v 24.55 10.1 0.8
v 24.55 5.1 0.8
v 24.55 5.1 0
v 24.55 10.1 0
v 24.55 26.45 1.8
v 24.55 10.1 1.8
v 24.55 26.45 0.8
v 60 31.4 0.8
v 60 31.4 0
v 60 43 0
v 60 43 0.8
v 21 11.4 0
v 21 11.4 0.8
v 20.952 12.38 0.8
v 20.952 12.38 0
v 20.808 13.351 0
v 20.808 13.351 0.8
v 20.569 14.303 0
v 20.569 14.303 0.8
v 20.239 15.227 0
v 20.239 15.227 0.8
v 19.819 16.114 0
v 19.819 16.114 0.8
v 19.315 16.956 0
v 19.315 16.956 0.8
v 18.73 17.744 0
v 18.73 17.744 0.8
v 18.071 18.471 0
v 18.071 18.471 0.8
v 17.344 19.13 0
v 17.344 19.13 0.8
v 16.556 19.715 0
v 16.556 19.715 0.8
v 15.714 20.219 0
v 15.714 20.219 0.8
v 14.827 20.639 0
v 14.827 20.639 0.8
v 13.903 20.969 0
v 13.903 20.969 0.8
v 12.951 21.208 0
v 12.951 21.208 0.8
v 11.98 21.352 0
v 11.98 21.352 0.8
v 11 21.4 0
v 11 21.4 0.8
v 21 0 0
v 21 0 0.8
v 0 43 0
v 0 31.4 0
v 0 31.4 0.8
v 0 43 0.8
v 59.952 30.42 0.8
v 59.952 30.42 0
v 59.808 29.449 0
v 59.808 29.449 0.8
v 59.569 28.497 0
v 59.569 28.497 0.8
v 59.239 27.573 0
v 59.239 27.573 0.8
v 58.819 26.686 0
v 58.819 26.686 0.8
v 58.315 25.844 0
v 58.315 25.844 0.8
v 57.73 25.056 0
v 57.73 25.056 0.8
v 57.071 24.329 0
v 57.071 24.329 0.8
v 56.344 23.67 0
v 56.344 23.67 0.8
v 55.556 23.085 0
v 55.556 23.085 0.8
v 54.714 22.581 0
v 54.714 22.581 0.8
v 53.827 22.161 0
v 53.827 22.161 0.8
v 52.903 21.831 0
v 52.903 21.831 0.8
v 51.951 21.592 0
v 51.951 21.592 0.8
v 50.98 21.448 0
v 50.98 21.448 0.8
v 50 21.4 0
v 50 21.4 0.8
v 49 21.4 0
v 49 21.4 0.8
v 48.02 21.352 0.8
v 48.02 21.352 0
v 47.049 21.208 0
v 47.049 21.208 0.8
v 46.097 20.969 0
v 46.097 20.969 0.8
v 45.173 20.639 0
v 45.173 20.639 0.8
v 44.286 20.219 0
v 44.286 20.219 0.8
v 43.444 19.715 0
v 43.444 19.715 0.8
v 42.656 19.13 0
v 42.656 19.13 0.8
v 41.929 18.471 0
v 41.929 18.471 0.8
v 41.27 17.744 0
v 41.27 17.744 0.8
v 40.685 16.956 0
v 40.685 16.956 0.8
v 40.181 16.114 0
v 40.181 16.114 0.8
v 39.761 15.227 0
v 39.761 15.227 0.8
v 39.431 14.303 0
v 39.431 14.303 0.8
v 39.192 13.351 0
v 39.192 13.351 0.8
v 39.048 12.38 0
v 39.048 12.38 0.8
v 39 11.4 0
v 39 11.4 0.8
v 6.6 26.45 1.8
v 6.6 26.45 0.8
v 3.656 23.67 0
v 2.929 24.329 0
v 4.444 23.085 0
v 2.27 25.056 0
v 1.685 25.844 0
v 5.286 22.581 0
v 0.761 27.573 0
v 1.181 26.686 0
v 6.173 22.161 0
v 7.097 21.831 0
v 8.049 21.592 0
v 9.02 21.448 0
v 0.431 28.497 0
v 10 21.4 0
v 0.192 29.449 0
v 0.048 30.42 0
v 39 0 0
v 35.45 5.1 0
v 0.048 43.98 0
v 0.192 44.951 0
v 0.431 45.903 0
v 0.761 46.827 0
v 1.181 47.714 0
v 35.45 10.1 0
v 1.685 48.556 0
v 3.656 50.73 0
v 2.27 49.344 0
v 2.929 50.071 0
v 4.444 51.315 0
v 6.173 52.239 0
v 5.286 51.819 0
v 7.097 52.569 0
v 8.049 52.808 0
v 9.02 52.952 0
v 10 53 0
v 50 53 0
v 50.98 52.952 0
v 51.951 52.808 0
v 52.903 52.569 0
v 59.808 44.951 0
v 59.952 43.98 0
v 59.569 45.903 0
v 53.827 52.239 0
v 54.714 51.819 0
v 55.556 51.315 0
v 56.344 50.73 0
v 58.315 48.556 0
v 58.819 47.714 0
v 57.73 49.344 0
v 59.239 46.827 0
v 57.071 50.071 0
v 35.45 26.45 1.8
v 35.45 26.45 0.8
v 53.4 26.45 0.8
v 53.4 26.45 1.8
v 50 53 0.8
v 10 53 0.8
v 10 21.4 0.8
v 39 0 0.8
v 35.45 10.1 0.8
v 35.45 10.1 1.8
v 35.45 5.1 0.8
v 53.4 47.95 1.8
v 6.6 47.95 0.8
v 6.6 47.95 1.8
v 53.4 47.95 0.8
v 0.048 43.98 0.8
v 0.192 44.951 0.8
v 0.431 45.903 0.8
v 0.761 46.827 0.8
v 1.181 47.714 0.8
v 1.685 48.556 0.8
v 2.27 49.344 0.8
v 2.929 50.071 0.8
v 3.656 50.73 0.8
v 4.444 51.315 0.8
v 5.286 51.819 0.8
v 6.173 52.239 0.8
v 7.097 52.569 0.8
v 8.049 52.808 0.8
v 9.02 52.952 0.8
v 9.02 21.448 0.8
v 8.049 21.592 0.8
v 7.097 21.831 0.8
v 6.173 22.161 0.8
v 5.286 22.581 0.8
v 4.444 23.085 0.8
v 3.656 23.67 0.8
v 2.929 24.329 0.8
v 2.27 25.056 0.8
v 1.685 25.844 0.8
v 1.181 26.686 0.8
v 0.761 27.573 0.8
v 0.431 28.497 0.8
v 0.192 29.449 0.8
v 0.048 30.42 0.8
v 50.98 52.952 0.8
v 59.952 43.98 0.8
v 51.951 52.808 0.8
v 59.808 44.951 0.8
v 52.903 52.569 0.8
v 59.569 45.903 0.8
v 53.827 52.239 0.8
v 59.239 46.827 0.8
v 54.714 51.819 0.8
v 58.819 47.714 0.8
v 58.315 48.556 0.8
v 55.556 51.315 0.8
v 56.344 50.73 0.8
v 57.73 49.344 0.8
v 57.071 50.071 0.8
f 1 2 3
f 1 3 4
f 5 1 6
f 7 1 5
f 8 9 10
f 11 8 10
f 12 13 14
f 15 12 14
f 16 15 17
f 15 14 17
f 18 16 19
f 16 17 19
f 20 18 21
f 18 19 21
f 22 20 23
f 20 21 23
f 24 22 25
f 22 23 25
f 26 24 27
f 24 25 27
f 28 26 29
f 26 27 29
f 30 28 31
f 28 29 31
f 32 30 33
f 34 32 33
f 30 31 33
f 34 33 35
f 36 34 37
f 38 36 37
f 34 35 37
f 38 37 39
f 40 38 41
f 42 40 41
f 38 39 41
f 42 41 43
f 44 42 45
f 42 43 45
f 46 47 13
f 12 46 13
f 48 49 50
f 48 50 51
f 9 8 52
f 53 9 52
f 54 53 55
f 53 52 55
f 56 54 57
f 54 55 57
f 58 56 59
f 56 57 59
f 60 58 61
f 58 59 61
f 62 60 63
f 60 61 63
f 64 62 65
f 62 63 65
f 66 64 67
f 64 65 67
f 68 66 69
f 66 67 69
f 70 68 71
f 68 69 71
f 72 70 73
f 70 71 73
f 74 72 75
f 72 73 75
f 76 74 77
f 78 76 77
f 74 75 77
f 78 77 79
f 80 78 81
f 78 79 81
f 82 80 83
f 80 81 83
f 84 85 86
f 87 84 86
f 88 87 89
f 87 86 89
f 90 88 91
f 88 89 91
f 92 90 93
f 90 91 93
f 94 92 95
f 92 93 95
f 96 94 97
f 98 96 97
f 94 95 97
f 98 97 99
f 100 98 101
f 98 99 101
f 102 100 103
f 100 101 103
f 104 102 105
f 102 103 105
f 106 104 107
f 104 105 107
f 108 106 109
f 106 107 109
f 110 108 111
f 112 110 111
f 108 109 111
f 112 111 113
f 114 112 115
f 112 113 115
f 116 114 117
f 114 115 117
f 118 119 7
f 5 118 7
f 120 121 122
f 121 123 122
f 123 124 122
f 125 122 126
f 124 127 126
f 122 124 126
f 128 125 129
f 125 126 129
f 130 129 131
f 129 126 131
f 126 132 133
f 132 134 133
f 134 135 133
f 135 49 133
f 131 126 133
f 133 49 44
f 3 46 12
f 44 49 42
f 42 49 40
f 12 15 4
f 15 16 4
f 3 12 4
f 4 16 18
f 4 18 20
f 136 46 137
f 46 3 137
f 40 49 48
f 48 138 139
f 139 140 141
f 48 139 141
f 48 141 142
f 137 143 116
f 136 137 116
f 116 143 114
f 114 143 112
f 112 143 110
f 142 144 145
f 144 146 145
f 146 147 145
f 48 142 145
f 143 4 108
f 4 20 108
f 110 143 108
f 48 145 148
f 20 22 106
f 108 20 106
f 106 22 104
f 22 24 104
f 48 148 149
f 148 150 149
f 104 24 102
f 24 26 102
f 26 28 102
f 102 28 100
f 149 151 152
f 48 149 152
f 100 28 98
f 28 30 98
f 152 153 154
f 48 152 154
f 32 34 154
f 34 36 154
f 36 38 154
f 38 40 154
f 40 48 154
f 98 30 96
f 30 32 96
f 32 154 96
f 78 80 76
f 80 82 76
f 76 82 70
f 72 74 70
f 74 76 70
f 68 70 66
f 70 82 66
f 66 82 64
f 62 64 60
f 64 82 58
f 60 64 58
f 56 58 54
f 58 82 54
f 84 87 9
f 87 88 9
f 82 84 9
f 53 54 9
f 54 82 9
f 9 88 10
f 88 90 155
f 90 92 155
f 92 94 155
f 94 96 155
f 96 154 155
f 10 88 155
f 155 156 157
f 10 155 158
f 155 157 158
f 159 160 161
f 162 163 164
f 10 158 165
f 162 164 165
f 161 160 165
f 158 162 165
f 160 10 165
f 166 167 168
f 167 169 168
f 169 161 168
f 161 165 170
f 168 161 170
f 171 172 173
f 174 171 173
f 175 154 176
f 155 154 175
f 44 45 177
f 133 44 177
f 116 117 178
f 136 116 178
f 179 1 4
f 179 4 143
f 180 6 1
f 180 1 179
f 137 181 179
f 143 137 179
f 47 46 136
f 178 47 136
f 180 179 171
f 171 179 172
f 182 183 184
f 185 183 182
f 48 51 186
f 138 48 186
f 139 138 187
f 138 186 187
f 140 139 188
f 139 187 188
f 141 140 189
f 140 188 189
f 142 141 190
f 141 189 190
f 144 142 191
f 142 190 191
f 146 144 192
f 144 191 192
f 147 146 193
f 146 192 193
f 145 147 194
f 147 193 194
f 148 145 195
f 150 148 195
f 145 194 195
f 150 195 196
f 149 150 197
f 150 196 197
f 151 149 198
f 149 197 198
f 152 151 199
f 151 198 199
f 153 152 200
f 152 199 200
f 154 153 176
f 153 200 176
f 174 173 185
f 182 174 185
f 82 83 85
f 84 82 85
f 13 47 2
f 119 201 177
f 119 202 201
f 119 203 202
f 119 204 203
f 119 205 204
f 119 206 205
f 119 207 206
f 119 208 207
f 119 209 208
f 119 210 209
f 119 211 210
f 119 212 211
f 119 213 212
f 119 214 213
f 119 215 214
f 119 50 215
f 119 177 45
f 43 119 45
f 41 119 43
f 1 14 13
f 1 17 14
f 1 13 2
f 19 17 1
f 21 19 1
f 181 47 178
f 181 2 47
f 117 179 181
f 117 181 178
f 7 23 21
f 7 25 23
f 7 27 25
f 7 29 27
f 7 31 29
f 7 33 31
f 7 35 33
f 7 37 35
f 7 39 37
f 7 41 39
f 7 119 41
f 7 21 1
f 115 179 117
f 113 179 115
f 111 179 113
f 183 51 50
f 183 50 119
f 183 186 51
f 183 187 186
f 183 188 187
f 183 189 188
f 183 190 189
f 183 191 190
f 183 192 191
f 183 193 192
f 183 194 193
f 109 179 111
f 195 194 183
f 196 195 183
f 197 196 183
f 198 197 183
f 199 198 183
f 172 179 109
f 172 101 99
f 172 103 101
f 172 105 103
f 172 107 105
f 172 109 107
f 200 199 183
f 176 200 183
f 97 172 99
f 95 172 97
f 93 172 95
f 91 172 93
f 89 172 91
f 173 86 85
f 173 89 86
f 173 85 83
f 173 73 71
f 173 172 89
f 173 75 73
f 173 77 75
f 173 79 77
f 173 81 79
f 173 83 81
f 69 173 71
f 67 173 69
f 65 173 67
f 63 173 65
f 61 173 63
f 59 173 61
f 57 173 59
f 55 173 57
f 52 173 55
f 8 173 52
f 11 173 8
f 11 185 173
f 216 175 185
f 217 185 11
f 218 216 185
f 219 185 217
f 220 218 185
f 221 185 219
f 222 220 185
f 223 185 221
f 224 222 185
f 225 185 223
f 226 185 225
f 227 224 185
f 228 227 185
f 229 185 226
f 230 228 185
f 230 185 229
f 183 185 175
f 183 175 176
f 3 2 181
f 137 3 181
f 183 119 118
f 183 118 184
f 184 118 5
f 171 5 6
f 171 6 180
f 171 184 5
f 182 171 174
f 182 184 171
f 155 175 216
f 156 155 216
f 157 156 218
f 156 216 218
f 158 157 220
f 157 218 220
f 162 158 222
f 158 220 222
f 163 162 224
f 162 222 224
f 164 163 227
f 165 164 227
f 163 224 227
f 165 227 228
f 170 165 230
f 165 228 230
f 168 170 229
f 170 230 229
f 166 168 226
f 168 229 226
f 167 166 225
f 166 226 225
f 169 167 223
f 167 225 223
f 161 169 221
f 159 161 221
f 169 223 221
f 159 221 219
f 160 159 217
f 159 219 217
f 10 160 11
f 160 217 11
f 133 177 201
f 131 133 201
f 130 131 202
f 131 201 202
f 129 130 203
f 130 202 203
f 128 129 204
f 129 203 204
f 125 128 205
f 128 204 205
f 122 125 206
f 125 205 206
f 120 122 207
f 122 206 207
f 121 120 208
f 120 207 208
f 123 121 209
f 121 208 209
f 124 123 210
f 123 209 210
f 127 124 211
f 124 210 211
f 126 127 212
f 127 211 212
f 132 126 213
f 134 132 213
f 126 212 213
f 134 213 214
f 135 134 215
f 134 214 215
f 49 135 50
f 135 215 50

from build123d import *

# Parameters (mm, degrees)
SKETCH1_W           = 60
SKETCH1_H           = 53
BOSS_EXTRUDE1_DEPTH = 0.8
CUT_EXTRUDE2_DEPTH  = 0.8
SKETCH3_W           = 10.9
SKETCH3_H           = 21.35
SKETCH3_W_2         = 46.8
SKETCH3_H_2         = 21.5
BOSS_EXTRUDE2_DEPTH = 1
SKETCH4_W           = 10.9
SKETCH4_H           = 5
CUT_EXTRUDE3_DEPTH  = 10


with BuildPart() as part:
    # Sketch1 → Boss-Extrude1 (new body)
    with BuildSketch(Plane.XY):
        with Locations((30, 26.5)):
            Rectangle(SKETCH1_W, SKETCH1_H)
    extrude(amount=BOSS_EXTRUDE1_DEPTH)

    # Sketch2 → Cut-Extrude2 (cut)
    with BuildSketch(Plane.XY.offset(0.8)):
        with BuildLine():
            ThreePointArc((0, 43), (2.928932188, 50.071067812), (10, 53))
            Line((10, 53), (0, 53))
            Line((0, 53), (0, 43))
        make_face()
        with BuildLine():
            ThreePointArc((10, 21.4), (2.928932188, 24.328932188), (0, 31.4))
            Line((0, 31.4), (0, 0))
            Line((0, 0), (21, 0))
            Line((21, 0), (21, 11.4))
            ThreePointArc((21, 11.4), (18.071067812, 18.471067812), (11, 21.4))
            Line((11, 21.4), (10, 21.4))
        make_face()
        with BuildLine():
            Line((60, 0), (60, 31.4))
            ThreePointArc((60, 31.4), (57.071067812, 24.328932188), (50, 21.4))
            Line((50, 21.4), (49, 21.4))
            ThreePointArc((49, 21.4), (41.928932188, 18.471067812), (39, 11.4))
            Line((39, 11.4), (39, 0))
            Line((39, 0), (60, 0))
        make_face()
        with BuildLine():
            Line((60, 53), (50, 53))
            ThreePointArc((50, 53), (57.071067812, 50.071067812), (60, 43))
            Line((60, 43), (60, 53))
        make_face()
    extrude(amount=-CUT_EXTRUDE2_DEPTH, mode=Mode.SUBTRACT)

    # Sketch3 → Boss-Extrude2 (add)
    with BuildSketch(Plane.XY.offset(0.8)):
        with Locations((30, 15.775)):
            Rectangle(SKETCH3_W, SKETCH3_H)
        with Locations((30, 37.2)):
            Rectangle(SKETCH3_W_2, SKETCH3_H_2)
    extrude(amount=BOSS_EXTRUDE2_DEPTH)

    # Sketch4 → Cut-Extrude3 (cut)
    with BuildSketch(Plane.XY.offset(1.8)):
        with Locations((30, 7.6)):
            Rectangle(SKETCH4_W, SKETCH4_H)
    extrude(amount=-CUT_EXTRUDE3_DEPTH, mode=Mode.SUBTRACT)


solid = part.part
